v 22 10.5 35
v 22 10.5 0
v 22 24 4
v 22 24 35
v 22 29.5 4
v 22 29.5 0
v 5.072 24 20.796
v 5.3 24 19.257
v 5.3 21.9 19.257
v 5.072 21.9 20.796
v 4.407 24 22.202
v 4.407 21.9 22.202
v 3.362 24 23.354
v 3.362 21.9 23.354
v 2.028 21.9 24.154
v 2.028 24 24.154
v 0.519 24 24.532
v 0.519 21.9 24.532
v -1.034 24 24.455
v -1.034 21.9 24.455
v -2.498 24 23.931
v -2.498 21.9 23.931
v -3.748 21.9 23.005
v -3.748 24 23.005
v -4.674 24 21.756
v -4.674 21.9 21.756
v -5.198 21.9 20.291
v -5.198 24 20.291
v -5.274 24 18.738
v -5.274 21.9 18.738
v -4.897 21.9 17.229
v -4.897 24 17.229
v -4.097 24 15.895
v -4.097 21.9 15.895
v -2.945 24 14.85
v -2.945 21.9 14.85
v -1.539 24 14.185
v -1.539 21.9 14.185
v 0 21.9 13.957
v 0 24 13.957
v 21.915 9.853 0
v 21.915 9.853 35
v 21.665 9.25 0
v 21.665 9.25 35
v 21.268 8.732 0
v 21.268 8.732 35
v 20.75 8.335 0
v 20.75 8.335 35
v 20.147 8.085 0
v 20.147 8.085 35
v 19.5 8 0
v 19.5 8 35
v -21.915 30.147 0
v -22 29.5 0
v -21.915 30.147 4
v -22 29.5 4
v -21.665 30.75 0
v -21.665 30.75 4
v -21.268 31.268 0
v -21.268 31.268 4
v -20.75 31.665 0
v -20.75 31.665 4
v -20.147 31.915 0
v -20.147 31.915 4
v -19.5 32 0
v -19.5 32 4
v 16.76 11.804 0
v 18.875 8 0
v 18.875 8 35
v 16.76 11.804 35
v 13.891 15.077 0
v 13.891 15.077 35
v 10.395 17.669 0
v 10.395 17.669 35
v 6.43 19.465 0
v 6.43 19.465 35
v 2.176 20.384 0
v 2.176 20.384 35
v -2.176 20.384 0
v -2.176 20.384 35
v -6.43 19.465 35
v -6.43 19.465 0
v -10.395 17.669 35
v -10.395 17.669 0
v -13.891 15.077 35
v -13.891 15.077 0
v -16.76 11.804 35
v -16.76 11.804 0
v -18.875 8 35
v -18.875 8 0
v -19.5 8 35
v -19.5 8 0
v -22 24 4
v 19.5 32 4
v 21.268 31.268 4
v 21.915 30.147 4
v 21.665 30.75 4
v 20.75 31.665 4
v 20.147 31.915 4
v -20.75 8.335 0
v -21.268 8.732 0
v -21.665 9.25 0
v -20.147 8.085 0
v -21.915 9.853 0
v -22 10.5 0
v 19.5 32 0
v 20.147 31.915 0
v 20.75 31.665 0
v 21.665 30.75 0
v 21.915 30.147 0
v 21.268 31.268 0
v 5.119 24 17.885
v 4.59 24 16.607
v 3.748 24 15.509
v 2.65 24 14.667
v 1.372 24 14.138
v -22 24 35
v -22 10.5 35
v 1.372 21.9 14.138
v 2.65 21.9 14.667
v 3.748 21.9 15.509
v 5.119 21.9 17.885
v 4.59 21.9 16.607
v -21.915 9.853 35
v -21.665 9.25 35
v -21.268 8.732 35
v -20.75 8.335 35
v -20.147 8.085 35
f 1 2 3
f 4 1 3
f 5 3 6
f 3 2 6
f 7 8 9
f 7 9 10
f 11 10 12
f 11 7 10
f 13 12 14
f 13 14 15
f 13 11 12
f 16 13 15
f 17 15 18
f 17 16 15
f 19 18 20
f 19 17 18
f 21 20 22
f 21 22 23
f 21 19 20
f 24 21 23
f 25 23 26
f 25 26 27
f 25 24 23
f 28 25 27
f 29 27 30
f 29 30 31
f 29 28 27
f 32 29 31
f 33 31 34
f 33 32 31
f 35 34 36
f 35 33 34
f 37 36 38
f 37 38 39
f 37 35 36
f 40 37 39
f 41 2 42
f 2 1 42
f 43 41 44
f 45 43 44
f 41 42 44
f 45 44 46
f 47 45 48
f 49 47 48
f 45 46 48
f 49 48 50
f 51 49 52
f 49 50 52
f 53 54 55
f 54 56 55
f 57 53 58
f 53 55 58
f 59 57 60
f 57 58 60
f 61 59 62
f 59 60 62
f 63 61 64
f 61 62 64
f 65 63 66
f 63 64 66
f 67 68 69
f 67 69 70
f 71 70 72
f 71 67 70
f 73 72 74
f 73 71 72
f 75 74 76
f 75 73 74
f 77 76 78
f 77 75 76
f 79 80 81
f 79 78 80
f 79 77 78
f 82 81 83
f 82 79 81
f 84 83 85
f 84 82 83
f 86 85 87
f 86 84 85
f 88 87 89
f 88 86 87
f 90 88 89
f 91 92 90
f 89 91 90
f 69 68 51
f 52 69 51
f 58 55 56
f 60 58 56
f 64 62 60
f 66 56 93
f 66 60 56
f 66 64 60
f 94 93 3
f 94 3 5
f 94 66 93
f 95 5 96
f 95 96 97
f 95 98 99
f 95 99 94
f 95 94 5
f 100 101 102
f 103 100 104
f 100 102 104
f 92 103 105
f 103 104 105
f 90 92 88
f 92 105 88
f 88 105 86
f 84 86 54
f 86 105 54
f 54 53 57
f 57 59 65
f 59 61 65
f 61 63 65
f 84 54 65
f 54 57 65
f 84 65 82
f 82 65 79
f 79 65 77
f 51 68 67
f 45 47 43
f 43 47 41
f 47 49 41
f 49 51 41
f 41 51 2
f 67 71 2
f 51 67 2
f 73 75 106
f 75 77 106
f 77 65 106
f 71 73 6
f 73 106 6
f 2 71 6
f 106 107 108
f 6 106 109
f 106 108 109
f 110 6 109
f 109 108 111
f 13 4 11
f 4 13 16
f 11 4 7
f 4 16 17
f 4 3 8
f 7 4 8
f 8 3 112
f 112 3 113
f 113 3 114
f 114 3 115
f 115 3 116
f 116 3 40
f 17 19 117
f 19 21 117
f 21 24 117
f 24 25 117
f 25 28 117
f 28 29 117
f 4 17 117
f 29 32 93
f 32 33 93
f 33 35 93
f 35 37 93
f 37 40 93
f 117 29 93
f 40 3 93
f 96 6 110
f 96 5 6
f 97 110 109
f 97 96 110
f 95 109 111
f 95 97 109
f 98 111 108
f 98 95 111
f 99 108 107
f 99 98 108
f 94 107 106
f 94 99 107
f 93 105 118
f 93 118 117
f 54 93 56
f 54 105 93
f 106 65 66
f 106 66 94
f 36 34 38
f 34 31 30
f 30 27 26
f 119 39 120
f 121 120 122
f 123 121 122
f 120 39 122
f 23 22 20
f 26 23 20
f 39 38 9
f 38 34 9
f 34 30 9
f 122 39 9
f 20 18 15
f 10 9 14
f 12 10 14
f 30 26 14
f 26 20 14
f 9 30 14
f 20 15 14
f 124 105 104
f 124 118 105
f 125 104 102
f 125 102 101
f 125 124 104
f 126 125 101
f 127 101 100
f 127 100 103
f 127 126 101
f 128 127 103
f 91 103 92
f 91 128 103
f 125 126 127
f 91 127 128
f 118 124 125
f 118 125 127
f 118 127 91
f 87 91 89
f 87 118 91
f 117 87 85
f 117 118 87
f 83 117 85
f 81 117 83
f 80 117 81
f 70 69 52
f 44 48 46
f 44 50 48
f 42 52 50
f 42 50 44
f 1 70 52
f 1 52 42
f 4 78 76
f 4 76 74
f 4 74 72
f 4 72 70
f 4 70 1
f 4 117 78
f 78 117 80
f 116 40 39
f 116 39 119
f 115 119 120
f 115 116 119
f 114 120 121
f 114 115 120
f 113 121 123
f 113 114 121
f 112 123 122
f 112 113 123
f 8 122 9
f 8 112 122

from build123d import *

# Parameters (mm, degrees)
F0_R     = 20.5
F1_DEPTH = 50
F3_DEPTH = 35
F5_W     = 44
F5_H     = 8
F6_DEPTH = 4
F7_R     = 2.5
F9_DEPTH = 2.1


with BuildPart() as f1:
    # F0 (on Top) → F1 (new body)
    with BuildSketch(Plane.XY):
        Circle(F0_R)
    extrude(amount=F1_DEPTH)


with BuildPart() as f3:
    # F2 (on Top) → F3 (new body)
    with BuildSketch(Plane.XY):
        Polygon((-22, 8), (0, 8), (22, 8), (22, 24), (-22, 24), align=None)
    extrude(amount=F3_DEPTH)

    # F4: cut F1
    add(f1.part, mode=Mode.SUBTRACT)

    # F5 (on Top) → F6 (join)
    with BuildSketch(Plane.XY):
        with Locations((0, 28)):
            Rectangle(F5_W, F5_H)
    extrude(amount=F6_DEPTH)

    # F7
    f7_edges = [f3.edges().sort_by_distance(p)[0] for p in [
        (-22, 8, 17.5),
        (22, 8, 17.5),
        (-22, 32, 2),
        (22, 32, 2),
    ]]
    fillet(f7_edges, radius=F7_R)


with BuildPart() as f9:
    # F8 (on Front) → F9 (new body)
    with BuildSketch(Plane.XZ):
        with BuildLine():
            ThreePointArc((0, 13.957158041), (3.7476659403, 15.5094921007), (5.3, 19.257158041))
            ThreePointArc((5.3, 19.257158041), (-3.7476659403, 23.0048239813), (0, 13.957158041))
        make_face()
    extrude(amount=F9_DEPTH)


with BuildPart() as f9_1:
    # F10: moved
    add(f9.part.moved(Location((0, 24, 0))))


with BuildPart() as f3_1:
    add(f3.part)

    # F11: cut F9
    add(f9_1.part, mode=Mode.SUBTRACT)


solid = f3_1.part
